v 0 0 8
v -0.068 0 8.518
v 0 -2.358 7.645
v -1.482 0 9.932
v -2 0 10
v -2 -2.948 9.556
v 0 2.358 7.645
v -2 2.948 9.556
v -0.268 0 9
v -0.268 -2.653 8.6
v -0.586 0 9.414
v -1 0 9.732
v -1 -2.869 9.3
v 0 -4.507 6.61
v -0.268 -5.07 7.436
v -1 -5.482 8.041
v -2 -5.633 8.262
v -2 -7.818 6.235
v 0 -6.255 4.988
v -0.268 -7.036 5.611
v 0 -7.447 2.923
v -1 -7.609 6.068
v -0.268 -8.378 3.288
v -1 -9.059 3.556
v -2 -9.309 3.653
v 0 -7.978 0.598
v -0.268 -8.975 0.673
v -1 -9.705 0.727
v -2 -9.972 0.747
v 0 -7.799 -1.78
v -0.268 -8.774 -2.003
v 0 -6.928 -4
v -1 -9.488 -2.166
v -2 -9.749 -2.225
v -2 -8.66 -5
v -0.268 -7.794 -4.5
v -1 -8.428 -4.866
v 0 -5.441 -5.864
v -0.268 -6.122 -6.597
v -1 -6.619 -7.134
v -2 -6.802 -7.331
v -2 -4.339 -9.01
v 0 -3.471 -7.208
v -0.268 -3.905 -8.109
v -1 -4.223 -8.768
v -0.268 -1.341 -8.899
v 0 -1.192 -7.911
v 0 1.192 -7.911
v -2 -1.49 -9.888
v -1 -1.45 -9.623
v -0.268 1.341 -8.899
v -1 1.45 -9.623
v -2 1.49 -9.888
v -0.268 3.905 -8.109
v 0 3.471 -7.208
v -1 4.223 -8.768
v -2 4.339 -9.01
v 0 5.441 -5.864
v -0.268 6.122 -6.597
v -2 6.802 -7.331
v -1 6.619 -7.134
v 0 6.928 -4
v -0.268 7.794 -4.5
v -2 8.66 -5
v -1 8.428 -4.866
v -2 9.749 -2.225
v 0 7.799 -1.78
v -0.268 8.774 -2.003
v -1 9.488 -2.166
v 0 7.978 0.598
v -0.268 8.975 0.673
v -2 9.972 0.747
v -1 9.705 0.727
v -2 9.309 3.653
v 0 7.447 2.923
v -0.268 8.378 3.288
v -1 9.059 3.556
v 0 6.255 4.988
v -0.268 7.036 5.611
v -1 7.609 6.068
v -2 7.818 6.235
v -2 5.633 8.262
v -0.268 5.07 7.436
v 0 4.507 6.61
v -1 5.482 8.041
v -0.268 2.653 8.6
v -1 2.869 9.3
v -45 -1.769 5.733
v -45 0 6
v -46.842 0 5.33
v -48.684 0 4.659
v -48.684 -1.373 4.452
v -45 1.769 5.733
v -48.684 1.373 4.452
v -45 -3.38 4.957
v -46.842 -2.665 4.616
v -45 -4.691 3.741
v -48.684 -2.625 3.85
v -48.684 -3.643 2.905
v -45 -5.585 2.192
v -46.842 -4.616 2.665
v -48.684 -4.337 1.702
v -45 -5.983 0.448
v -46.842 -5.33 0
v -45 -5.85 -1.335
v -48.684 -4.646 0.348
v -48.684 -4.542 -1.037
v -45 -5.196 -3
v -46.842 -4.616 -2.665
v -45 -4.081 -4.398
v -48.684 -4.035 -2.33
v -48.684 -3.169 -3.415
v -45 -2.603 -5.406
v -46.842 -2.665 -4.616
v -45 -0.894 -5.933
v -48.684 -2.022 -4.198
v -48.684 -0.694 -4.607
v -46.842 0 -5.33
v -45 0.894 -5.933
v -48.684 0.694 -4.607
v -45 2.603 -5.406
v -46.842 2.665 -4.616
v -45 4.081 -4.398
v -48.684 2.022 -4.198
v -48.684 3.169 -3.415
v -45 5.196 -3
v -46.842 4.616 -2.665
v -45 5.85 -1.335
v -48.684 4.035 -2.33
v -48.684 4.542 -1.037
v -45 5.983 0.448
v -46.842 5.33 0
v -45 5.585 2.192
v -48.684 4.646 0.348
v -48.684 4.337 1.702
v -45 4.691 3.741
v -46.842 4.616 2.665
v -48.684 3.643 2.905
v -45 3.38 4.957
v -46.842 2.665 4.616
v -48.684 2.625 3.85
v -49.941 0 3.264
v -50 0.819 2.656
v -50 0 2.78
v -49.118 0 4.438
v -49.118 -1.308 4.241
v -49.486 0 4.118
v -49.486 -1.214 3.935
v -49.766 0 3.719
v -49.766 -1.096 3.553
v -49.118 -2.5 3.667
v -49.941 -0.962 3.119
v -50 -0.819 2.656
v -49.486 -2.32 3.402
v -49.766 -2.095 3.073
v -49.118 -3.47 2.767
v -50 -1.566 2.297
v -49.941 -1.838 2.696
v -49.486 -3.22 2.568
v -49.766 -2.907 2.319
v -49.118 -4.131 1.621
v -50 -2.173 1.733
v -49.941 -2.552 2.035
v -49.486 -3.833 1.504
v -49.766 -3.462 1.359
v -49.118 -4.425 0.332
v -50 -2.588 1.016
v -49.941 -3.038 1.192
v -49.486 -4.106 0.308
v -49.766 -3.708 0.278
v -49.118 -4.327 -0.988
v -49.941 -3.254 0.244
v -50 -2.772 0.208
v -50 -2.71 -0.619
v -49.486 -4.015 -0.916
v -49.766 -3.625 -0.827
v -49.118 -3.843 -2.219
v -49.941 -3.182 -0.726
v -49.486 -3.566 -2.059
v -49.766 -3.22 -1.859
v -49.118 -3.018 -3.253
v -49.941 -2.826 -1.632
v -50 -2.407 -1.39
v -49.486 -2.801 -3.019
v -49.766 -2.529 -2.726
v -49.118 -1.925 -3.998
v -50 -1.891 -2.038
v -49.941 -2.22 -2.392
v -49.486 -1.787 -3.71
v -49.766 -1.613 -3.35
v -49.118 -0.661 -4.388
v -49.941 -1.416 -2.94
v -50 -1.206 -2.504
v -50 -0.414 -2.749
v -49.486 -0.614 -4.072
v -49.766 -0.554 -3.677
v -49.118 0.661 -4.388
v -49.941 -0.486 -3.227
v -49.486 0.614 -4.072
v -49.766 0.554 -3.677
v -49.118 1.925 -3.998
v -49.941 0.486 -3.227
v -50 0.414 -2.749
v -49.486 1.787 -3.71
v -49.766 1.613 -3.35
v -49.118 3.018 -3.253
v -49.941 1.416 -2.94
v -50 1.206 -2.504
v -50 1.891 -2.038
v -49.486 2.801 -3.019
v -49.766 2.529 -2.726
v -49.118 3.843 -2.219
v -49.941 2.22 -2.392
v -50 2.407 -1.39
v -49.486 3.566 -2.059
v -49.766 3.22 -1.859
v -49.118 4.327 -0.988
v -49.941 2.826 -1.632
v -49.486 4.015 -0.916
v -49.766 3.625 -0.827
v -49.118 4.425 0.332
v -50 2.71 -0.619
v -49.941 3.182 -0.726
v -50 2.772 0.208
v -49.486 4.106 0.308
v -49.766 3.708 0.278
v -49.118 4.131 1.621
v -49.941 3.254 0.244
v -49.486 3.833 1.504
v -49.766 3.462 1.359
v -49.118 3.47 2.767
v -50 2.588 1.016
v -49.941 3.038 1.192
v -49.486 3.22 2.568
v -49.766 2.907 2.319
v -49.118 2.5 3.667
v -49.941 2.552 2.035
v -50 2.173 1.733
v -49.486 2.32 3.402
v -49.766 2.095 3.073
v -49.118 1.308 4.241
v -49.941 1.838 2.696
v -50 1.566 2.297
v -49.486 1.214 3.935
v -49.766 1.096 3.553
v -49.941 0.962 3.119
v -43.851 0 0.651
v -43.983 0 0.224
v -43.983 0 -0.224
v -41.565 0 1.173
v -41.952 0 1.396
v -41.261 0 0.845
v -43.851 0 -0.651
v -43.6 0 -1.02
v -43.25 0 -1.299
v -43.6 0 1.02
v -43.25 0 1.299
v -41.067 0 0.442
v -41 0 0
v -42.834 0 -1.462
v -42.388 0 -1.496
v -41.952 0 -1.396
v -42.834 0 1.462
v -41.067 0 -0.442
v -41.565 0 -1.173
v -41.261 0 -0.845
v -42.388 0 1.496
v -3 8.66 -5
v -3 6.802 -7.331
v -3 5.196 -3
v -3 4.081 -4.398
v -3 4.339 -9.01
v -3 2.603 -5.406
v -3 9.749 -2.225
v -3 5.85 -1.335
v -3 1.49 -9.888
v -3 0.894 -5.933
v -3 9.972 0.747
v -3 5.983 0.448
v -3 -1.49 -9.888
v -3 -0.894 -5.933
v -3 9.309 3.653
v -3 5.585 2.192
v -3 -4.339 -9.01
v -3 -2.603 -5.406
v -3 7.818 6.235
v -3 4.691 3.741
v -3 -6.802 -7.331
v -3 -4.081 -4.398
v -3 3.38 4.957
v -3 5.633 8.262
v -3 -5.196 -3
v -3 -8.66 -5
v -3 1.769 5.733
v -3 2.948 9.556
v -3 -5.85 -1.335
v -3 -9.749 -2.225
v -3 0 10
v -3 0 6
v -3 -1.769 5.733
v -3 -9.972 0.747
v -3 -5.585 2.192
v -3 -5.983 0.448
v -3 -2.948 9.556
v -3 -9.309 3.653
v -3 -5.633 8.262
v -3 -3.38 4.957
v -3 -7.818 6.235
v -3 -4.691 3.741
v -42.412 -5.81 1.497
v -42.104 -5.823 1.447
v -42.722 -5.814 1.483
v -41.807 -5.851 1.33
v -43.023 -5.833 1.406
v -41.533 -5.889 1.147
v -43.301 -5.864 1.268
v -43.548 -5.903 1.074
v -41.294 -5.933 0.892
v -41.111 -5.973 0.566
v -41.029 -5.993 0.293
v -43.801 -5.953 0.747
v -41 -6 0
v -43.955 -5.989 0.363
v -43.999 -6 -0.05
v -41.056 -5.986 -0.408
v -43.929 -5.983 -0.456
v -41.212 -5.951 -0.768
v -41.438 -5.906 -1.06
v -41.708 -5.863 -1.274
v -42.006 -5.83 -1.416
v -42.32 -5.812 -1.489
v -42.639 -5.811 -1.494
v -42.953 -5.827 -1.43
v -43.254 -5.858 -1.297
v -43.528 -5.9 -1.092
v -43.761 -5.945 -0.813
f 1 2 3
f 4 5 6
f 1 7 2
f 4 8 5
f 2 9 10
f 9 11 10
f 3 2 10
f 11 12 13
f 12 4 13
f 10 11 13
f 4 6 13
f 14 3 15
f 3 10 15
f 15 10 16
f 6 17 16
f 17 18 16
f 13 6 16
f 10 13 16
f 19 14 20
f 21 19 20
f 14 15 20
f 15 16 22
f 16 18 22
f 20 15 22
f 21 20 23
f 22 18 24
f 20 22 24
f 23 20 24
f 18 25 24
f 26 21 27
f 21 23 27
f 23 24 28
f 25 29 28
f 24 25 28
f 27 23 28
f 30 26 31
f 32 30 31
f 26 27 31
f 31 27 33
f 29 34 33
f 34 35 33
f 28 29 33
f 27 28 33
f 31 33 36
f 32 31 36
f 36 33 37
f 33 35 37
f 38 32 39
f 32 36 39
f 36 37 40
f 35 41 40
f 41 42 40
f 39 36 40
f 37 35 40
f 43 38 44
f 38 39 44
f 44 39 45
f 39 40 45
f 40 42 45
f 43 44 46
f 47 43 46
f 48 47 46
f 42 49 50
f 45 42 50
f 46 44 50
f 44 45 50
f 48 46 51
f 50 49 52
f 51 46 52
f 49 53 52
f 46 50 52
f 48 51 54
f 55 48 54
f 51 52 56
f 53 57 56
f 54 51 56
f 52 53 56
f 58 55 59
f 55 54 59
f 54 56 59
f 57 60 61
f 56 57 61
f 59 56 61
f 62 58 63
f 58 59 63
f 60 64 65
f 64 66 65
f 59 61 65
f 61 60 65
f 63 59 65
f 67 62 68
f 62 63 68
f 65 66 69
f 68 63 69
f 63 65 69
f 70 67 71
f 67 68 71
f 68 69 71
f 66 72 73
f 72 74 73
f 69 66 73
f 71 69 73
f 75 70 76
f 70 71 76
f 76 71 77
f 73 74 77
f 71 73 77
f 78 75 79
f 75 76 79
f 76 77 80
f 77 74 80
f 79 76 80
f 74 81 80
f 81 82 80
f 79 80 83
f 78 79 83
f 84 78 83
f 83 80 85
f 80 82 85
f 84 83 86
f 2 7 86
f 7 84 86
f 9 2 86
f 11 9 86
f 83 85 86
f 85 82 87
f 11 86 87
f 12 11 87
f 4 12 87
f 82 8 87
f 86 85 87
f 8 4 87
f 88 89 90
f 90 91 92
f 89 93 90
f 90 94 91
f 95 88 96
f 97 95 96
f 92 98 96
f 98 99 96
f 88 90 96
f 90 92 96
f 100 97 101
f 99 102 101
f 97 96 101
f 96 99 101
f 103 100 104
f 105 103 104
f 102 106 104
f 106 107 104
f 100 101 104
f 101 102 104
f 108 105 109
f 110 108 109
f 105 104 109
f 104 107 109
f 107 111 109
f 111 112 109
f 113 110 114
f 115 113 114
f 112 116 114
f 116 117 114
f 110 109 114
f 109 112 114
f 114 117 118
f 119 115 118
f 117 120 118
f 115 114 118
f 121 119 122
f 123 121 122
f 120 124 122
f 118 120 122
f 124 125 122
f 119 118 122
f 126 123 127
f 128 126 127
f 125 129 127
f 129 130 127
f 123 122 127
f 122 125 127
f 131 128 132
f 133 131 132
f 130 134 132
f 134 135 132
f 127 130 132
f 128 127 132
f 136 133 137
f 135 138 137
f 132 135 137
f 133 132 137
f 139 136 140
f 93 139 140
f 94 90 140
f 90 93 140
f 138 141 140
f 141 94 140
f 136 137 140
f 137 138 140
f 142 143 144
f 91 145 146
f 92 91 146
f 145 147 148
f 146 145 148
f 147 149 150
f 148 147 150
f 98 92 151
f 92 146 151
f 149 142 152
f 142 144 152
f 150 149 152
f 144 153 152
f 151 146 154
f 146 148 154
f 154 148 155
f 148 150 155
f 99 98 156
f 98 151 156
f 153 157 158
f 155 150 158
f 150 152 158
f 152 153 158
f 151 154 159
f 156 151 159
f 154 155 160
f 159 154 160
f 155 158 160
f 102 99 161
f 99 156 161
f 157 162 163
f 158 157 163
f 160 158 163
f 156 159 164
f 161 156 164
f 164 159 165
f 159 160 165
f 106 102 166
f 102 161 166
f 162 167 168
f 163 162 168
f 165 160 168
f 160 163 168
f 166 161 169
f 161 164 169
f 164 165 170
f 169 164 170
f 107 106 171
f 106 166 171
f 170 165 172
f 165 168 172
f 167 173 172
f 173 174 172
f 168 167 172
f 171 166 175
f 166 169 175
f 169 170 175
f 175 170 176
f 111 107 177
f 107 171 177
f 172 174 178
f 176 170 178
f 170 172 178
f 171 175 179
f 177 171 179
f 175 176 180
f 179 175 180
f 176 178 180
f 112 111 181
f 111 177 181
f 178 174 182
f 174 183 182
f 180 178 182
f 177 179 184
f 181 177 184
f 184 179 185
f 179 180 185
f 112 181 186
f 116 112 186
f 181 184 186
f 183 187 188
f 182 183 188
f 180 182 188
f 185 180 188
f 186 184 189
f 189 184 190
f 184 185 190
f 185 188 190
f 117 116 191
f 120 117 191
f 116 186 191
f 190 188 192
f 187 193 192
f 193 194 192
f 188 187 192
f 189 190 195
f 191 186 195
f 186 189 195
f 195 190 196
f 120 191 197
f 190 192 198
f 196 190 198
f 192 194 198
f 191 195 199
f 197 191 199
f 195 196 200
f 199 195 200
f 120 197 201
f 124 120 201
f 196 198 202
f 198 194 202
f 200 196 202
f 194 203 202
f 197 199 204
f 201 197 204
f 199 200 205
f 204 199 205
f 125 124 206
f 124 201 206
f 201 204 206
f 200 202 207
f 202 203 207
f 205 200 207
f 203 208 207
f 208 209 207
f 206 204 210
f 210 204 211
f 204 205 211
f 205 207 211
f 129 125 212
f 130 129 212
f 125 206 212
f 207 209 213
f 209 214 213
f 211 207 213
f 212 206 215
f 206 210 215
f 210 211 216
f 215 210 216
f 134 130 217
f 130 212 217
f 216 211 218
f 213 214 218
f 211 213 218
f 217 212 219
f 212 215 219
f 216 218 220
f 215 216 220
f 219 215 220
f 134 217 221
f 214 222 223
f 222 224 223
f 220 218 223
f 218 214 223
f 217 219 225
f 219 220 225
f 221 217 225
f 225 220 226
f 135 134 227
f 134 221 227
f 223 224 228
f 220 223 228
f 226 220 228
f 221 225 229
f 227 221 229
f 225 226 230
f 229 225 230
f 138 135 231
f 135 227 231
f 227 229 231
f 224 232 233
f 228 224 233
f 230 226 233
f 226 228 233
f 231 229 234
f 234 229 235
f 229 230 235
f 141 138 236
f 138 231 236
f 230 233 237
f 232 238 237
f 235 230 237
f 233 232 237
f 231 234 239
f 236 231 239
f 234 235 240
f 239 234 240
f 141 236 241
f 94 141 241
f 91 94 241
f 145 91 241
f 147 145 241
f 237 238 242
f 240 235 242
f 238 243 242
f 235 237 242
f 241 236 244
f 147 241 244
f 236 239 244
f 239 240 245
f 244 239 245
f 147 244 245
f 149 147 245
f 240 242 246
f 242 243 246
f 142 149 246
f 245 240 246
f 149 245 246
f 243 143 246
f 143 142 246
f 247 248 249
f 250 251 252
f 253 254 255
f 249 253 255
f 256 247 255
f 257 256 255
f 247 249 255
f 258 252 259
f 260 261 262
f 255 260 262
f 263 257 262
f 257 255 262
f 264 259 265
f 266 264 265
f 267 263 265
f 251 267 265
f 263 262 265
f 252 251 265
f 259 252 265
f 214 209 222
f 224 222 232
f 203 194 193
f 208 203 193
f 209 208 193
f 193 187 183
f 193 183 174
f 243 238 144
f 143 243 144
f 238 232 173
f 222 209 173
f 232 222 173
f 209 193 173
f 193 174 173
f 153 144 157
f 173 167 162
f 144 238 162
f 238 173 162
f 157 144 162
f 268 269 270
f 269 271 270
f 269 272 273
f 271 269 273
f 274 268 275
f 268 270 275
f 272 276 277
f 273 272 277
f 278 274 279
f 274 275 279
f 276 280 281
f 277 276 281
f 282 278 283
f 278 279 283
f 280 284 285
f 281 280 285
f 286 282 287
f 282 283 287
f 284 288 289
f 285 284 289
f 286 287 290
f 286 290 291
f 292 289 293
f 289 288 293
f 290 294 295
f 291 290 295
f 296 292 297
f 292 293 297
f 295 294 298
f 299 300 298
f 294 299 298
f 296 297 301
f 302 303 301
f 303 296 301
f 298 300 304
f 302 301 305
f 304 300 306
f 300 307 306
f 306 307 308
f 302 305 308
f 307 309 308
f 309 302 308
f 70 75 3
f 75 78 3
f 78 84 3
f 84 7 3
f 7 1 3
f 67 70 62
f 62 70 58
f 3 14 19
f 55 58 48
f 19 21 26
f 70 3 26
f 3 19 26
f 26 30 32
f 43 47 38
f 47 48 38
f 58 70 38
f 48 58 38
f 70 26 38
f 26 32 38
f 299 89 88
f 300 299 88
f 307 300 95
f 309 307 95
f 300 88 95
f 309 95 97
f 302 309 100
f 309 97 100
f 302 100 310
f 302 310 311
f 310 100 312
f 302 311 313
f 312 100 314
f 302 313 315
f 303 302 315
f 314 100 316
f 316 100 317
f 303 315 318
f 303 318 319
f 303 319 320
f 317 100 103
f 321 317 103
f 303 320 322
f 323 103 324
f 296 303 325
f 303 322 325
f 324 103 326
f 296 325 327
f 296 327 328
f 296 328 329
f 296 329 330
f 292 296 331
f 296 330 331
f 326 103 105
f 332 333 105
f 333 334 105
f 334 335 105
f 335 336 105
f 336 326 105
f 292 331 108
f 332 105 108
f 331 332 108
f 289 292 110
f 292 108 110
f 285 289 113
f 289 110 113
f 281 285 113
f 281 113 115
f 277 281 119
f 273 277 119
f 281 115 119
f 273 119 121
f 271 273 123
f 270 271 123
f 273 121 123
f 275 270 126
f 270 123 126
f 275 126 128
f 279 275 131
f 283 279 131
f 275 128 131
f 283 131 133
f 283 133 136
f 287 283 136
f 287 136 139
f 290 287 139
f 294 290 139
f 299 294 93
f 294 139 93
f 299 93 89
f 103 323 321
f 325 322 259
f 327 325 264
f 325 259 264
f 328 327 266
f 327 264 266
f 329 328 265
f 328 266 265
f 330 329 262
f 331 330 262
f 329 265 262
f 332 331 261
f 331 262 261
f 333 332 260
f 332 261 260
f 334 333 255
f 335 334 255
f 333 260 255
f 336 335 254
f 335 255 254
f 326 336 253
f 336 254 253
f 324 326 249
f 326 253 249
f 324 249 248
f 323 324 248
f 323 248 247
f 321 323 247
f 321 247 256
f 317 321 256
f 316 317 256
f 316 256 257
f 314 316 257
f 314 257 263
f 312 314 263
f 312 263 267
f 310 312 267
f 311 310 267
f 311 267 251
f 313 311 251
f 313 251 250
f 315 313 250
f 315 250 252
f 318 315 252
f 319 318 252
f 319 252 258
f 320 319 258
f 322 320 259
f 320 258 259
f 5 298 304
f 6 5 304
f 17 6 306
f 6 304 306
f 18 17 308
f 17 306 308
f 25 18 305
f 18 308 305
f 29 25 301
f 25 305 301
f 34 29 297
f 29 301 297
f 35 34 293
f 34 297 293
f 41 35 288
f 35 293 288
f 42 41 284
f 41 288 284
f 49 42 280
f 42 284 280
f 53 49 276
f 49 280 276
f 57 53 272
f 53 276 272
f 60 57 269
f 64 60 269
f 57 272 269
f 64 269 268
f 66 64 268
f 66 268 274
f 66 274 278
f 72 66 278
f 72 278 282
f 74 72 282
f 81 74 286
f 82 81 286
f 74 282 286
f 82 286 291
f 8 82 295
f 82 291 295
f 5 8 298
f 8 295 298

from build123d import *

# Parameters (mm, degrees)
F2_R     = 2
F3_SIZE2 = 1.8198511713
F3_SIZE  = 5
F4_R     = 2
F5_D     = 3
F5_DEPTH = 10.0010001


with BuildPart() as f1:
    # F0 (on Front) → F1 (revolve)
    with BuildSketch(Plane.XZ):
        Polygon((-50, 0), (0, 0), (0, 10), (-3, 10), (-3, 6), (-50, 6), align=None)
    revolve(axis=Axis((-25, 0, 0), (1, 0, 0)))

    # F2
    f2_edges = [f1.edges().sort_by_distance(p)[0] for p in [
        (0, 0, -10),
    ]]
    fillet(f2_edges, radius=F2_R)

    # F3
    f3_edges = [f1.edges().sort_by_distance(p)[0] for p in [
        (-50, 0, -6),
    ]]
    chamfer(f3_edges, length=F3_SIZE, length2=F3_SIZE2)

    # F4
    f4_edges = [f1.edges().sort_by_distance(p)[0] for p in [
        (-50, 0, -4.180149),
    ]]
    fillet(f4_edges, radius=F4_R)

    # F5 (through all, one way)
    with BuildSketch(Plane(origin=(0, 0, 0), x_dir=(1, 0, 0), z_dir=(0, 1, 0))):
        with Locations((-42.5, 0)):
            Circle(F5_D / 2)
    extrude(amount=-F5_DEPTH, mode=Mode.SUBTRACT)


solid = f1.part
